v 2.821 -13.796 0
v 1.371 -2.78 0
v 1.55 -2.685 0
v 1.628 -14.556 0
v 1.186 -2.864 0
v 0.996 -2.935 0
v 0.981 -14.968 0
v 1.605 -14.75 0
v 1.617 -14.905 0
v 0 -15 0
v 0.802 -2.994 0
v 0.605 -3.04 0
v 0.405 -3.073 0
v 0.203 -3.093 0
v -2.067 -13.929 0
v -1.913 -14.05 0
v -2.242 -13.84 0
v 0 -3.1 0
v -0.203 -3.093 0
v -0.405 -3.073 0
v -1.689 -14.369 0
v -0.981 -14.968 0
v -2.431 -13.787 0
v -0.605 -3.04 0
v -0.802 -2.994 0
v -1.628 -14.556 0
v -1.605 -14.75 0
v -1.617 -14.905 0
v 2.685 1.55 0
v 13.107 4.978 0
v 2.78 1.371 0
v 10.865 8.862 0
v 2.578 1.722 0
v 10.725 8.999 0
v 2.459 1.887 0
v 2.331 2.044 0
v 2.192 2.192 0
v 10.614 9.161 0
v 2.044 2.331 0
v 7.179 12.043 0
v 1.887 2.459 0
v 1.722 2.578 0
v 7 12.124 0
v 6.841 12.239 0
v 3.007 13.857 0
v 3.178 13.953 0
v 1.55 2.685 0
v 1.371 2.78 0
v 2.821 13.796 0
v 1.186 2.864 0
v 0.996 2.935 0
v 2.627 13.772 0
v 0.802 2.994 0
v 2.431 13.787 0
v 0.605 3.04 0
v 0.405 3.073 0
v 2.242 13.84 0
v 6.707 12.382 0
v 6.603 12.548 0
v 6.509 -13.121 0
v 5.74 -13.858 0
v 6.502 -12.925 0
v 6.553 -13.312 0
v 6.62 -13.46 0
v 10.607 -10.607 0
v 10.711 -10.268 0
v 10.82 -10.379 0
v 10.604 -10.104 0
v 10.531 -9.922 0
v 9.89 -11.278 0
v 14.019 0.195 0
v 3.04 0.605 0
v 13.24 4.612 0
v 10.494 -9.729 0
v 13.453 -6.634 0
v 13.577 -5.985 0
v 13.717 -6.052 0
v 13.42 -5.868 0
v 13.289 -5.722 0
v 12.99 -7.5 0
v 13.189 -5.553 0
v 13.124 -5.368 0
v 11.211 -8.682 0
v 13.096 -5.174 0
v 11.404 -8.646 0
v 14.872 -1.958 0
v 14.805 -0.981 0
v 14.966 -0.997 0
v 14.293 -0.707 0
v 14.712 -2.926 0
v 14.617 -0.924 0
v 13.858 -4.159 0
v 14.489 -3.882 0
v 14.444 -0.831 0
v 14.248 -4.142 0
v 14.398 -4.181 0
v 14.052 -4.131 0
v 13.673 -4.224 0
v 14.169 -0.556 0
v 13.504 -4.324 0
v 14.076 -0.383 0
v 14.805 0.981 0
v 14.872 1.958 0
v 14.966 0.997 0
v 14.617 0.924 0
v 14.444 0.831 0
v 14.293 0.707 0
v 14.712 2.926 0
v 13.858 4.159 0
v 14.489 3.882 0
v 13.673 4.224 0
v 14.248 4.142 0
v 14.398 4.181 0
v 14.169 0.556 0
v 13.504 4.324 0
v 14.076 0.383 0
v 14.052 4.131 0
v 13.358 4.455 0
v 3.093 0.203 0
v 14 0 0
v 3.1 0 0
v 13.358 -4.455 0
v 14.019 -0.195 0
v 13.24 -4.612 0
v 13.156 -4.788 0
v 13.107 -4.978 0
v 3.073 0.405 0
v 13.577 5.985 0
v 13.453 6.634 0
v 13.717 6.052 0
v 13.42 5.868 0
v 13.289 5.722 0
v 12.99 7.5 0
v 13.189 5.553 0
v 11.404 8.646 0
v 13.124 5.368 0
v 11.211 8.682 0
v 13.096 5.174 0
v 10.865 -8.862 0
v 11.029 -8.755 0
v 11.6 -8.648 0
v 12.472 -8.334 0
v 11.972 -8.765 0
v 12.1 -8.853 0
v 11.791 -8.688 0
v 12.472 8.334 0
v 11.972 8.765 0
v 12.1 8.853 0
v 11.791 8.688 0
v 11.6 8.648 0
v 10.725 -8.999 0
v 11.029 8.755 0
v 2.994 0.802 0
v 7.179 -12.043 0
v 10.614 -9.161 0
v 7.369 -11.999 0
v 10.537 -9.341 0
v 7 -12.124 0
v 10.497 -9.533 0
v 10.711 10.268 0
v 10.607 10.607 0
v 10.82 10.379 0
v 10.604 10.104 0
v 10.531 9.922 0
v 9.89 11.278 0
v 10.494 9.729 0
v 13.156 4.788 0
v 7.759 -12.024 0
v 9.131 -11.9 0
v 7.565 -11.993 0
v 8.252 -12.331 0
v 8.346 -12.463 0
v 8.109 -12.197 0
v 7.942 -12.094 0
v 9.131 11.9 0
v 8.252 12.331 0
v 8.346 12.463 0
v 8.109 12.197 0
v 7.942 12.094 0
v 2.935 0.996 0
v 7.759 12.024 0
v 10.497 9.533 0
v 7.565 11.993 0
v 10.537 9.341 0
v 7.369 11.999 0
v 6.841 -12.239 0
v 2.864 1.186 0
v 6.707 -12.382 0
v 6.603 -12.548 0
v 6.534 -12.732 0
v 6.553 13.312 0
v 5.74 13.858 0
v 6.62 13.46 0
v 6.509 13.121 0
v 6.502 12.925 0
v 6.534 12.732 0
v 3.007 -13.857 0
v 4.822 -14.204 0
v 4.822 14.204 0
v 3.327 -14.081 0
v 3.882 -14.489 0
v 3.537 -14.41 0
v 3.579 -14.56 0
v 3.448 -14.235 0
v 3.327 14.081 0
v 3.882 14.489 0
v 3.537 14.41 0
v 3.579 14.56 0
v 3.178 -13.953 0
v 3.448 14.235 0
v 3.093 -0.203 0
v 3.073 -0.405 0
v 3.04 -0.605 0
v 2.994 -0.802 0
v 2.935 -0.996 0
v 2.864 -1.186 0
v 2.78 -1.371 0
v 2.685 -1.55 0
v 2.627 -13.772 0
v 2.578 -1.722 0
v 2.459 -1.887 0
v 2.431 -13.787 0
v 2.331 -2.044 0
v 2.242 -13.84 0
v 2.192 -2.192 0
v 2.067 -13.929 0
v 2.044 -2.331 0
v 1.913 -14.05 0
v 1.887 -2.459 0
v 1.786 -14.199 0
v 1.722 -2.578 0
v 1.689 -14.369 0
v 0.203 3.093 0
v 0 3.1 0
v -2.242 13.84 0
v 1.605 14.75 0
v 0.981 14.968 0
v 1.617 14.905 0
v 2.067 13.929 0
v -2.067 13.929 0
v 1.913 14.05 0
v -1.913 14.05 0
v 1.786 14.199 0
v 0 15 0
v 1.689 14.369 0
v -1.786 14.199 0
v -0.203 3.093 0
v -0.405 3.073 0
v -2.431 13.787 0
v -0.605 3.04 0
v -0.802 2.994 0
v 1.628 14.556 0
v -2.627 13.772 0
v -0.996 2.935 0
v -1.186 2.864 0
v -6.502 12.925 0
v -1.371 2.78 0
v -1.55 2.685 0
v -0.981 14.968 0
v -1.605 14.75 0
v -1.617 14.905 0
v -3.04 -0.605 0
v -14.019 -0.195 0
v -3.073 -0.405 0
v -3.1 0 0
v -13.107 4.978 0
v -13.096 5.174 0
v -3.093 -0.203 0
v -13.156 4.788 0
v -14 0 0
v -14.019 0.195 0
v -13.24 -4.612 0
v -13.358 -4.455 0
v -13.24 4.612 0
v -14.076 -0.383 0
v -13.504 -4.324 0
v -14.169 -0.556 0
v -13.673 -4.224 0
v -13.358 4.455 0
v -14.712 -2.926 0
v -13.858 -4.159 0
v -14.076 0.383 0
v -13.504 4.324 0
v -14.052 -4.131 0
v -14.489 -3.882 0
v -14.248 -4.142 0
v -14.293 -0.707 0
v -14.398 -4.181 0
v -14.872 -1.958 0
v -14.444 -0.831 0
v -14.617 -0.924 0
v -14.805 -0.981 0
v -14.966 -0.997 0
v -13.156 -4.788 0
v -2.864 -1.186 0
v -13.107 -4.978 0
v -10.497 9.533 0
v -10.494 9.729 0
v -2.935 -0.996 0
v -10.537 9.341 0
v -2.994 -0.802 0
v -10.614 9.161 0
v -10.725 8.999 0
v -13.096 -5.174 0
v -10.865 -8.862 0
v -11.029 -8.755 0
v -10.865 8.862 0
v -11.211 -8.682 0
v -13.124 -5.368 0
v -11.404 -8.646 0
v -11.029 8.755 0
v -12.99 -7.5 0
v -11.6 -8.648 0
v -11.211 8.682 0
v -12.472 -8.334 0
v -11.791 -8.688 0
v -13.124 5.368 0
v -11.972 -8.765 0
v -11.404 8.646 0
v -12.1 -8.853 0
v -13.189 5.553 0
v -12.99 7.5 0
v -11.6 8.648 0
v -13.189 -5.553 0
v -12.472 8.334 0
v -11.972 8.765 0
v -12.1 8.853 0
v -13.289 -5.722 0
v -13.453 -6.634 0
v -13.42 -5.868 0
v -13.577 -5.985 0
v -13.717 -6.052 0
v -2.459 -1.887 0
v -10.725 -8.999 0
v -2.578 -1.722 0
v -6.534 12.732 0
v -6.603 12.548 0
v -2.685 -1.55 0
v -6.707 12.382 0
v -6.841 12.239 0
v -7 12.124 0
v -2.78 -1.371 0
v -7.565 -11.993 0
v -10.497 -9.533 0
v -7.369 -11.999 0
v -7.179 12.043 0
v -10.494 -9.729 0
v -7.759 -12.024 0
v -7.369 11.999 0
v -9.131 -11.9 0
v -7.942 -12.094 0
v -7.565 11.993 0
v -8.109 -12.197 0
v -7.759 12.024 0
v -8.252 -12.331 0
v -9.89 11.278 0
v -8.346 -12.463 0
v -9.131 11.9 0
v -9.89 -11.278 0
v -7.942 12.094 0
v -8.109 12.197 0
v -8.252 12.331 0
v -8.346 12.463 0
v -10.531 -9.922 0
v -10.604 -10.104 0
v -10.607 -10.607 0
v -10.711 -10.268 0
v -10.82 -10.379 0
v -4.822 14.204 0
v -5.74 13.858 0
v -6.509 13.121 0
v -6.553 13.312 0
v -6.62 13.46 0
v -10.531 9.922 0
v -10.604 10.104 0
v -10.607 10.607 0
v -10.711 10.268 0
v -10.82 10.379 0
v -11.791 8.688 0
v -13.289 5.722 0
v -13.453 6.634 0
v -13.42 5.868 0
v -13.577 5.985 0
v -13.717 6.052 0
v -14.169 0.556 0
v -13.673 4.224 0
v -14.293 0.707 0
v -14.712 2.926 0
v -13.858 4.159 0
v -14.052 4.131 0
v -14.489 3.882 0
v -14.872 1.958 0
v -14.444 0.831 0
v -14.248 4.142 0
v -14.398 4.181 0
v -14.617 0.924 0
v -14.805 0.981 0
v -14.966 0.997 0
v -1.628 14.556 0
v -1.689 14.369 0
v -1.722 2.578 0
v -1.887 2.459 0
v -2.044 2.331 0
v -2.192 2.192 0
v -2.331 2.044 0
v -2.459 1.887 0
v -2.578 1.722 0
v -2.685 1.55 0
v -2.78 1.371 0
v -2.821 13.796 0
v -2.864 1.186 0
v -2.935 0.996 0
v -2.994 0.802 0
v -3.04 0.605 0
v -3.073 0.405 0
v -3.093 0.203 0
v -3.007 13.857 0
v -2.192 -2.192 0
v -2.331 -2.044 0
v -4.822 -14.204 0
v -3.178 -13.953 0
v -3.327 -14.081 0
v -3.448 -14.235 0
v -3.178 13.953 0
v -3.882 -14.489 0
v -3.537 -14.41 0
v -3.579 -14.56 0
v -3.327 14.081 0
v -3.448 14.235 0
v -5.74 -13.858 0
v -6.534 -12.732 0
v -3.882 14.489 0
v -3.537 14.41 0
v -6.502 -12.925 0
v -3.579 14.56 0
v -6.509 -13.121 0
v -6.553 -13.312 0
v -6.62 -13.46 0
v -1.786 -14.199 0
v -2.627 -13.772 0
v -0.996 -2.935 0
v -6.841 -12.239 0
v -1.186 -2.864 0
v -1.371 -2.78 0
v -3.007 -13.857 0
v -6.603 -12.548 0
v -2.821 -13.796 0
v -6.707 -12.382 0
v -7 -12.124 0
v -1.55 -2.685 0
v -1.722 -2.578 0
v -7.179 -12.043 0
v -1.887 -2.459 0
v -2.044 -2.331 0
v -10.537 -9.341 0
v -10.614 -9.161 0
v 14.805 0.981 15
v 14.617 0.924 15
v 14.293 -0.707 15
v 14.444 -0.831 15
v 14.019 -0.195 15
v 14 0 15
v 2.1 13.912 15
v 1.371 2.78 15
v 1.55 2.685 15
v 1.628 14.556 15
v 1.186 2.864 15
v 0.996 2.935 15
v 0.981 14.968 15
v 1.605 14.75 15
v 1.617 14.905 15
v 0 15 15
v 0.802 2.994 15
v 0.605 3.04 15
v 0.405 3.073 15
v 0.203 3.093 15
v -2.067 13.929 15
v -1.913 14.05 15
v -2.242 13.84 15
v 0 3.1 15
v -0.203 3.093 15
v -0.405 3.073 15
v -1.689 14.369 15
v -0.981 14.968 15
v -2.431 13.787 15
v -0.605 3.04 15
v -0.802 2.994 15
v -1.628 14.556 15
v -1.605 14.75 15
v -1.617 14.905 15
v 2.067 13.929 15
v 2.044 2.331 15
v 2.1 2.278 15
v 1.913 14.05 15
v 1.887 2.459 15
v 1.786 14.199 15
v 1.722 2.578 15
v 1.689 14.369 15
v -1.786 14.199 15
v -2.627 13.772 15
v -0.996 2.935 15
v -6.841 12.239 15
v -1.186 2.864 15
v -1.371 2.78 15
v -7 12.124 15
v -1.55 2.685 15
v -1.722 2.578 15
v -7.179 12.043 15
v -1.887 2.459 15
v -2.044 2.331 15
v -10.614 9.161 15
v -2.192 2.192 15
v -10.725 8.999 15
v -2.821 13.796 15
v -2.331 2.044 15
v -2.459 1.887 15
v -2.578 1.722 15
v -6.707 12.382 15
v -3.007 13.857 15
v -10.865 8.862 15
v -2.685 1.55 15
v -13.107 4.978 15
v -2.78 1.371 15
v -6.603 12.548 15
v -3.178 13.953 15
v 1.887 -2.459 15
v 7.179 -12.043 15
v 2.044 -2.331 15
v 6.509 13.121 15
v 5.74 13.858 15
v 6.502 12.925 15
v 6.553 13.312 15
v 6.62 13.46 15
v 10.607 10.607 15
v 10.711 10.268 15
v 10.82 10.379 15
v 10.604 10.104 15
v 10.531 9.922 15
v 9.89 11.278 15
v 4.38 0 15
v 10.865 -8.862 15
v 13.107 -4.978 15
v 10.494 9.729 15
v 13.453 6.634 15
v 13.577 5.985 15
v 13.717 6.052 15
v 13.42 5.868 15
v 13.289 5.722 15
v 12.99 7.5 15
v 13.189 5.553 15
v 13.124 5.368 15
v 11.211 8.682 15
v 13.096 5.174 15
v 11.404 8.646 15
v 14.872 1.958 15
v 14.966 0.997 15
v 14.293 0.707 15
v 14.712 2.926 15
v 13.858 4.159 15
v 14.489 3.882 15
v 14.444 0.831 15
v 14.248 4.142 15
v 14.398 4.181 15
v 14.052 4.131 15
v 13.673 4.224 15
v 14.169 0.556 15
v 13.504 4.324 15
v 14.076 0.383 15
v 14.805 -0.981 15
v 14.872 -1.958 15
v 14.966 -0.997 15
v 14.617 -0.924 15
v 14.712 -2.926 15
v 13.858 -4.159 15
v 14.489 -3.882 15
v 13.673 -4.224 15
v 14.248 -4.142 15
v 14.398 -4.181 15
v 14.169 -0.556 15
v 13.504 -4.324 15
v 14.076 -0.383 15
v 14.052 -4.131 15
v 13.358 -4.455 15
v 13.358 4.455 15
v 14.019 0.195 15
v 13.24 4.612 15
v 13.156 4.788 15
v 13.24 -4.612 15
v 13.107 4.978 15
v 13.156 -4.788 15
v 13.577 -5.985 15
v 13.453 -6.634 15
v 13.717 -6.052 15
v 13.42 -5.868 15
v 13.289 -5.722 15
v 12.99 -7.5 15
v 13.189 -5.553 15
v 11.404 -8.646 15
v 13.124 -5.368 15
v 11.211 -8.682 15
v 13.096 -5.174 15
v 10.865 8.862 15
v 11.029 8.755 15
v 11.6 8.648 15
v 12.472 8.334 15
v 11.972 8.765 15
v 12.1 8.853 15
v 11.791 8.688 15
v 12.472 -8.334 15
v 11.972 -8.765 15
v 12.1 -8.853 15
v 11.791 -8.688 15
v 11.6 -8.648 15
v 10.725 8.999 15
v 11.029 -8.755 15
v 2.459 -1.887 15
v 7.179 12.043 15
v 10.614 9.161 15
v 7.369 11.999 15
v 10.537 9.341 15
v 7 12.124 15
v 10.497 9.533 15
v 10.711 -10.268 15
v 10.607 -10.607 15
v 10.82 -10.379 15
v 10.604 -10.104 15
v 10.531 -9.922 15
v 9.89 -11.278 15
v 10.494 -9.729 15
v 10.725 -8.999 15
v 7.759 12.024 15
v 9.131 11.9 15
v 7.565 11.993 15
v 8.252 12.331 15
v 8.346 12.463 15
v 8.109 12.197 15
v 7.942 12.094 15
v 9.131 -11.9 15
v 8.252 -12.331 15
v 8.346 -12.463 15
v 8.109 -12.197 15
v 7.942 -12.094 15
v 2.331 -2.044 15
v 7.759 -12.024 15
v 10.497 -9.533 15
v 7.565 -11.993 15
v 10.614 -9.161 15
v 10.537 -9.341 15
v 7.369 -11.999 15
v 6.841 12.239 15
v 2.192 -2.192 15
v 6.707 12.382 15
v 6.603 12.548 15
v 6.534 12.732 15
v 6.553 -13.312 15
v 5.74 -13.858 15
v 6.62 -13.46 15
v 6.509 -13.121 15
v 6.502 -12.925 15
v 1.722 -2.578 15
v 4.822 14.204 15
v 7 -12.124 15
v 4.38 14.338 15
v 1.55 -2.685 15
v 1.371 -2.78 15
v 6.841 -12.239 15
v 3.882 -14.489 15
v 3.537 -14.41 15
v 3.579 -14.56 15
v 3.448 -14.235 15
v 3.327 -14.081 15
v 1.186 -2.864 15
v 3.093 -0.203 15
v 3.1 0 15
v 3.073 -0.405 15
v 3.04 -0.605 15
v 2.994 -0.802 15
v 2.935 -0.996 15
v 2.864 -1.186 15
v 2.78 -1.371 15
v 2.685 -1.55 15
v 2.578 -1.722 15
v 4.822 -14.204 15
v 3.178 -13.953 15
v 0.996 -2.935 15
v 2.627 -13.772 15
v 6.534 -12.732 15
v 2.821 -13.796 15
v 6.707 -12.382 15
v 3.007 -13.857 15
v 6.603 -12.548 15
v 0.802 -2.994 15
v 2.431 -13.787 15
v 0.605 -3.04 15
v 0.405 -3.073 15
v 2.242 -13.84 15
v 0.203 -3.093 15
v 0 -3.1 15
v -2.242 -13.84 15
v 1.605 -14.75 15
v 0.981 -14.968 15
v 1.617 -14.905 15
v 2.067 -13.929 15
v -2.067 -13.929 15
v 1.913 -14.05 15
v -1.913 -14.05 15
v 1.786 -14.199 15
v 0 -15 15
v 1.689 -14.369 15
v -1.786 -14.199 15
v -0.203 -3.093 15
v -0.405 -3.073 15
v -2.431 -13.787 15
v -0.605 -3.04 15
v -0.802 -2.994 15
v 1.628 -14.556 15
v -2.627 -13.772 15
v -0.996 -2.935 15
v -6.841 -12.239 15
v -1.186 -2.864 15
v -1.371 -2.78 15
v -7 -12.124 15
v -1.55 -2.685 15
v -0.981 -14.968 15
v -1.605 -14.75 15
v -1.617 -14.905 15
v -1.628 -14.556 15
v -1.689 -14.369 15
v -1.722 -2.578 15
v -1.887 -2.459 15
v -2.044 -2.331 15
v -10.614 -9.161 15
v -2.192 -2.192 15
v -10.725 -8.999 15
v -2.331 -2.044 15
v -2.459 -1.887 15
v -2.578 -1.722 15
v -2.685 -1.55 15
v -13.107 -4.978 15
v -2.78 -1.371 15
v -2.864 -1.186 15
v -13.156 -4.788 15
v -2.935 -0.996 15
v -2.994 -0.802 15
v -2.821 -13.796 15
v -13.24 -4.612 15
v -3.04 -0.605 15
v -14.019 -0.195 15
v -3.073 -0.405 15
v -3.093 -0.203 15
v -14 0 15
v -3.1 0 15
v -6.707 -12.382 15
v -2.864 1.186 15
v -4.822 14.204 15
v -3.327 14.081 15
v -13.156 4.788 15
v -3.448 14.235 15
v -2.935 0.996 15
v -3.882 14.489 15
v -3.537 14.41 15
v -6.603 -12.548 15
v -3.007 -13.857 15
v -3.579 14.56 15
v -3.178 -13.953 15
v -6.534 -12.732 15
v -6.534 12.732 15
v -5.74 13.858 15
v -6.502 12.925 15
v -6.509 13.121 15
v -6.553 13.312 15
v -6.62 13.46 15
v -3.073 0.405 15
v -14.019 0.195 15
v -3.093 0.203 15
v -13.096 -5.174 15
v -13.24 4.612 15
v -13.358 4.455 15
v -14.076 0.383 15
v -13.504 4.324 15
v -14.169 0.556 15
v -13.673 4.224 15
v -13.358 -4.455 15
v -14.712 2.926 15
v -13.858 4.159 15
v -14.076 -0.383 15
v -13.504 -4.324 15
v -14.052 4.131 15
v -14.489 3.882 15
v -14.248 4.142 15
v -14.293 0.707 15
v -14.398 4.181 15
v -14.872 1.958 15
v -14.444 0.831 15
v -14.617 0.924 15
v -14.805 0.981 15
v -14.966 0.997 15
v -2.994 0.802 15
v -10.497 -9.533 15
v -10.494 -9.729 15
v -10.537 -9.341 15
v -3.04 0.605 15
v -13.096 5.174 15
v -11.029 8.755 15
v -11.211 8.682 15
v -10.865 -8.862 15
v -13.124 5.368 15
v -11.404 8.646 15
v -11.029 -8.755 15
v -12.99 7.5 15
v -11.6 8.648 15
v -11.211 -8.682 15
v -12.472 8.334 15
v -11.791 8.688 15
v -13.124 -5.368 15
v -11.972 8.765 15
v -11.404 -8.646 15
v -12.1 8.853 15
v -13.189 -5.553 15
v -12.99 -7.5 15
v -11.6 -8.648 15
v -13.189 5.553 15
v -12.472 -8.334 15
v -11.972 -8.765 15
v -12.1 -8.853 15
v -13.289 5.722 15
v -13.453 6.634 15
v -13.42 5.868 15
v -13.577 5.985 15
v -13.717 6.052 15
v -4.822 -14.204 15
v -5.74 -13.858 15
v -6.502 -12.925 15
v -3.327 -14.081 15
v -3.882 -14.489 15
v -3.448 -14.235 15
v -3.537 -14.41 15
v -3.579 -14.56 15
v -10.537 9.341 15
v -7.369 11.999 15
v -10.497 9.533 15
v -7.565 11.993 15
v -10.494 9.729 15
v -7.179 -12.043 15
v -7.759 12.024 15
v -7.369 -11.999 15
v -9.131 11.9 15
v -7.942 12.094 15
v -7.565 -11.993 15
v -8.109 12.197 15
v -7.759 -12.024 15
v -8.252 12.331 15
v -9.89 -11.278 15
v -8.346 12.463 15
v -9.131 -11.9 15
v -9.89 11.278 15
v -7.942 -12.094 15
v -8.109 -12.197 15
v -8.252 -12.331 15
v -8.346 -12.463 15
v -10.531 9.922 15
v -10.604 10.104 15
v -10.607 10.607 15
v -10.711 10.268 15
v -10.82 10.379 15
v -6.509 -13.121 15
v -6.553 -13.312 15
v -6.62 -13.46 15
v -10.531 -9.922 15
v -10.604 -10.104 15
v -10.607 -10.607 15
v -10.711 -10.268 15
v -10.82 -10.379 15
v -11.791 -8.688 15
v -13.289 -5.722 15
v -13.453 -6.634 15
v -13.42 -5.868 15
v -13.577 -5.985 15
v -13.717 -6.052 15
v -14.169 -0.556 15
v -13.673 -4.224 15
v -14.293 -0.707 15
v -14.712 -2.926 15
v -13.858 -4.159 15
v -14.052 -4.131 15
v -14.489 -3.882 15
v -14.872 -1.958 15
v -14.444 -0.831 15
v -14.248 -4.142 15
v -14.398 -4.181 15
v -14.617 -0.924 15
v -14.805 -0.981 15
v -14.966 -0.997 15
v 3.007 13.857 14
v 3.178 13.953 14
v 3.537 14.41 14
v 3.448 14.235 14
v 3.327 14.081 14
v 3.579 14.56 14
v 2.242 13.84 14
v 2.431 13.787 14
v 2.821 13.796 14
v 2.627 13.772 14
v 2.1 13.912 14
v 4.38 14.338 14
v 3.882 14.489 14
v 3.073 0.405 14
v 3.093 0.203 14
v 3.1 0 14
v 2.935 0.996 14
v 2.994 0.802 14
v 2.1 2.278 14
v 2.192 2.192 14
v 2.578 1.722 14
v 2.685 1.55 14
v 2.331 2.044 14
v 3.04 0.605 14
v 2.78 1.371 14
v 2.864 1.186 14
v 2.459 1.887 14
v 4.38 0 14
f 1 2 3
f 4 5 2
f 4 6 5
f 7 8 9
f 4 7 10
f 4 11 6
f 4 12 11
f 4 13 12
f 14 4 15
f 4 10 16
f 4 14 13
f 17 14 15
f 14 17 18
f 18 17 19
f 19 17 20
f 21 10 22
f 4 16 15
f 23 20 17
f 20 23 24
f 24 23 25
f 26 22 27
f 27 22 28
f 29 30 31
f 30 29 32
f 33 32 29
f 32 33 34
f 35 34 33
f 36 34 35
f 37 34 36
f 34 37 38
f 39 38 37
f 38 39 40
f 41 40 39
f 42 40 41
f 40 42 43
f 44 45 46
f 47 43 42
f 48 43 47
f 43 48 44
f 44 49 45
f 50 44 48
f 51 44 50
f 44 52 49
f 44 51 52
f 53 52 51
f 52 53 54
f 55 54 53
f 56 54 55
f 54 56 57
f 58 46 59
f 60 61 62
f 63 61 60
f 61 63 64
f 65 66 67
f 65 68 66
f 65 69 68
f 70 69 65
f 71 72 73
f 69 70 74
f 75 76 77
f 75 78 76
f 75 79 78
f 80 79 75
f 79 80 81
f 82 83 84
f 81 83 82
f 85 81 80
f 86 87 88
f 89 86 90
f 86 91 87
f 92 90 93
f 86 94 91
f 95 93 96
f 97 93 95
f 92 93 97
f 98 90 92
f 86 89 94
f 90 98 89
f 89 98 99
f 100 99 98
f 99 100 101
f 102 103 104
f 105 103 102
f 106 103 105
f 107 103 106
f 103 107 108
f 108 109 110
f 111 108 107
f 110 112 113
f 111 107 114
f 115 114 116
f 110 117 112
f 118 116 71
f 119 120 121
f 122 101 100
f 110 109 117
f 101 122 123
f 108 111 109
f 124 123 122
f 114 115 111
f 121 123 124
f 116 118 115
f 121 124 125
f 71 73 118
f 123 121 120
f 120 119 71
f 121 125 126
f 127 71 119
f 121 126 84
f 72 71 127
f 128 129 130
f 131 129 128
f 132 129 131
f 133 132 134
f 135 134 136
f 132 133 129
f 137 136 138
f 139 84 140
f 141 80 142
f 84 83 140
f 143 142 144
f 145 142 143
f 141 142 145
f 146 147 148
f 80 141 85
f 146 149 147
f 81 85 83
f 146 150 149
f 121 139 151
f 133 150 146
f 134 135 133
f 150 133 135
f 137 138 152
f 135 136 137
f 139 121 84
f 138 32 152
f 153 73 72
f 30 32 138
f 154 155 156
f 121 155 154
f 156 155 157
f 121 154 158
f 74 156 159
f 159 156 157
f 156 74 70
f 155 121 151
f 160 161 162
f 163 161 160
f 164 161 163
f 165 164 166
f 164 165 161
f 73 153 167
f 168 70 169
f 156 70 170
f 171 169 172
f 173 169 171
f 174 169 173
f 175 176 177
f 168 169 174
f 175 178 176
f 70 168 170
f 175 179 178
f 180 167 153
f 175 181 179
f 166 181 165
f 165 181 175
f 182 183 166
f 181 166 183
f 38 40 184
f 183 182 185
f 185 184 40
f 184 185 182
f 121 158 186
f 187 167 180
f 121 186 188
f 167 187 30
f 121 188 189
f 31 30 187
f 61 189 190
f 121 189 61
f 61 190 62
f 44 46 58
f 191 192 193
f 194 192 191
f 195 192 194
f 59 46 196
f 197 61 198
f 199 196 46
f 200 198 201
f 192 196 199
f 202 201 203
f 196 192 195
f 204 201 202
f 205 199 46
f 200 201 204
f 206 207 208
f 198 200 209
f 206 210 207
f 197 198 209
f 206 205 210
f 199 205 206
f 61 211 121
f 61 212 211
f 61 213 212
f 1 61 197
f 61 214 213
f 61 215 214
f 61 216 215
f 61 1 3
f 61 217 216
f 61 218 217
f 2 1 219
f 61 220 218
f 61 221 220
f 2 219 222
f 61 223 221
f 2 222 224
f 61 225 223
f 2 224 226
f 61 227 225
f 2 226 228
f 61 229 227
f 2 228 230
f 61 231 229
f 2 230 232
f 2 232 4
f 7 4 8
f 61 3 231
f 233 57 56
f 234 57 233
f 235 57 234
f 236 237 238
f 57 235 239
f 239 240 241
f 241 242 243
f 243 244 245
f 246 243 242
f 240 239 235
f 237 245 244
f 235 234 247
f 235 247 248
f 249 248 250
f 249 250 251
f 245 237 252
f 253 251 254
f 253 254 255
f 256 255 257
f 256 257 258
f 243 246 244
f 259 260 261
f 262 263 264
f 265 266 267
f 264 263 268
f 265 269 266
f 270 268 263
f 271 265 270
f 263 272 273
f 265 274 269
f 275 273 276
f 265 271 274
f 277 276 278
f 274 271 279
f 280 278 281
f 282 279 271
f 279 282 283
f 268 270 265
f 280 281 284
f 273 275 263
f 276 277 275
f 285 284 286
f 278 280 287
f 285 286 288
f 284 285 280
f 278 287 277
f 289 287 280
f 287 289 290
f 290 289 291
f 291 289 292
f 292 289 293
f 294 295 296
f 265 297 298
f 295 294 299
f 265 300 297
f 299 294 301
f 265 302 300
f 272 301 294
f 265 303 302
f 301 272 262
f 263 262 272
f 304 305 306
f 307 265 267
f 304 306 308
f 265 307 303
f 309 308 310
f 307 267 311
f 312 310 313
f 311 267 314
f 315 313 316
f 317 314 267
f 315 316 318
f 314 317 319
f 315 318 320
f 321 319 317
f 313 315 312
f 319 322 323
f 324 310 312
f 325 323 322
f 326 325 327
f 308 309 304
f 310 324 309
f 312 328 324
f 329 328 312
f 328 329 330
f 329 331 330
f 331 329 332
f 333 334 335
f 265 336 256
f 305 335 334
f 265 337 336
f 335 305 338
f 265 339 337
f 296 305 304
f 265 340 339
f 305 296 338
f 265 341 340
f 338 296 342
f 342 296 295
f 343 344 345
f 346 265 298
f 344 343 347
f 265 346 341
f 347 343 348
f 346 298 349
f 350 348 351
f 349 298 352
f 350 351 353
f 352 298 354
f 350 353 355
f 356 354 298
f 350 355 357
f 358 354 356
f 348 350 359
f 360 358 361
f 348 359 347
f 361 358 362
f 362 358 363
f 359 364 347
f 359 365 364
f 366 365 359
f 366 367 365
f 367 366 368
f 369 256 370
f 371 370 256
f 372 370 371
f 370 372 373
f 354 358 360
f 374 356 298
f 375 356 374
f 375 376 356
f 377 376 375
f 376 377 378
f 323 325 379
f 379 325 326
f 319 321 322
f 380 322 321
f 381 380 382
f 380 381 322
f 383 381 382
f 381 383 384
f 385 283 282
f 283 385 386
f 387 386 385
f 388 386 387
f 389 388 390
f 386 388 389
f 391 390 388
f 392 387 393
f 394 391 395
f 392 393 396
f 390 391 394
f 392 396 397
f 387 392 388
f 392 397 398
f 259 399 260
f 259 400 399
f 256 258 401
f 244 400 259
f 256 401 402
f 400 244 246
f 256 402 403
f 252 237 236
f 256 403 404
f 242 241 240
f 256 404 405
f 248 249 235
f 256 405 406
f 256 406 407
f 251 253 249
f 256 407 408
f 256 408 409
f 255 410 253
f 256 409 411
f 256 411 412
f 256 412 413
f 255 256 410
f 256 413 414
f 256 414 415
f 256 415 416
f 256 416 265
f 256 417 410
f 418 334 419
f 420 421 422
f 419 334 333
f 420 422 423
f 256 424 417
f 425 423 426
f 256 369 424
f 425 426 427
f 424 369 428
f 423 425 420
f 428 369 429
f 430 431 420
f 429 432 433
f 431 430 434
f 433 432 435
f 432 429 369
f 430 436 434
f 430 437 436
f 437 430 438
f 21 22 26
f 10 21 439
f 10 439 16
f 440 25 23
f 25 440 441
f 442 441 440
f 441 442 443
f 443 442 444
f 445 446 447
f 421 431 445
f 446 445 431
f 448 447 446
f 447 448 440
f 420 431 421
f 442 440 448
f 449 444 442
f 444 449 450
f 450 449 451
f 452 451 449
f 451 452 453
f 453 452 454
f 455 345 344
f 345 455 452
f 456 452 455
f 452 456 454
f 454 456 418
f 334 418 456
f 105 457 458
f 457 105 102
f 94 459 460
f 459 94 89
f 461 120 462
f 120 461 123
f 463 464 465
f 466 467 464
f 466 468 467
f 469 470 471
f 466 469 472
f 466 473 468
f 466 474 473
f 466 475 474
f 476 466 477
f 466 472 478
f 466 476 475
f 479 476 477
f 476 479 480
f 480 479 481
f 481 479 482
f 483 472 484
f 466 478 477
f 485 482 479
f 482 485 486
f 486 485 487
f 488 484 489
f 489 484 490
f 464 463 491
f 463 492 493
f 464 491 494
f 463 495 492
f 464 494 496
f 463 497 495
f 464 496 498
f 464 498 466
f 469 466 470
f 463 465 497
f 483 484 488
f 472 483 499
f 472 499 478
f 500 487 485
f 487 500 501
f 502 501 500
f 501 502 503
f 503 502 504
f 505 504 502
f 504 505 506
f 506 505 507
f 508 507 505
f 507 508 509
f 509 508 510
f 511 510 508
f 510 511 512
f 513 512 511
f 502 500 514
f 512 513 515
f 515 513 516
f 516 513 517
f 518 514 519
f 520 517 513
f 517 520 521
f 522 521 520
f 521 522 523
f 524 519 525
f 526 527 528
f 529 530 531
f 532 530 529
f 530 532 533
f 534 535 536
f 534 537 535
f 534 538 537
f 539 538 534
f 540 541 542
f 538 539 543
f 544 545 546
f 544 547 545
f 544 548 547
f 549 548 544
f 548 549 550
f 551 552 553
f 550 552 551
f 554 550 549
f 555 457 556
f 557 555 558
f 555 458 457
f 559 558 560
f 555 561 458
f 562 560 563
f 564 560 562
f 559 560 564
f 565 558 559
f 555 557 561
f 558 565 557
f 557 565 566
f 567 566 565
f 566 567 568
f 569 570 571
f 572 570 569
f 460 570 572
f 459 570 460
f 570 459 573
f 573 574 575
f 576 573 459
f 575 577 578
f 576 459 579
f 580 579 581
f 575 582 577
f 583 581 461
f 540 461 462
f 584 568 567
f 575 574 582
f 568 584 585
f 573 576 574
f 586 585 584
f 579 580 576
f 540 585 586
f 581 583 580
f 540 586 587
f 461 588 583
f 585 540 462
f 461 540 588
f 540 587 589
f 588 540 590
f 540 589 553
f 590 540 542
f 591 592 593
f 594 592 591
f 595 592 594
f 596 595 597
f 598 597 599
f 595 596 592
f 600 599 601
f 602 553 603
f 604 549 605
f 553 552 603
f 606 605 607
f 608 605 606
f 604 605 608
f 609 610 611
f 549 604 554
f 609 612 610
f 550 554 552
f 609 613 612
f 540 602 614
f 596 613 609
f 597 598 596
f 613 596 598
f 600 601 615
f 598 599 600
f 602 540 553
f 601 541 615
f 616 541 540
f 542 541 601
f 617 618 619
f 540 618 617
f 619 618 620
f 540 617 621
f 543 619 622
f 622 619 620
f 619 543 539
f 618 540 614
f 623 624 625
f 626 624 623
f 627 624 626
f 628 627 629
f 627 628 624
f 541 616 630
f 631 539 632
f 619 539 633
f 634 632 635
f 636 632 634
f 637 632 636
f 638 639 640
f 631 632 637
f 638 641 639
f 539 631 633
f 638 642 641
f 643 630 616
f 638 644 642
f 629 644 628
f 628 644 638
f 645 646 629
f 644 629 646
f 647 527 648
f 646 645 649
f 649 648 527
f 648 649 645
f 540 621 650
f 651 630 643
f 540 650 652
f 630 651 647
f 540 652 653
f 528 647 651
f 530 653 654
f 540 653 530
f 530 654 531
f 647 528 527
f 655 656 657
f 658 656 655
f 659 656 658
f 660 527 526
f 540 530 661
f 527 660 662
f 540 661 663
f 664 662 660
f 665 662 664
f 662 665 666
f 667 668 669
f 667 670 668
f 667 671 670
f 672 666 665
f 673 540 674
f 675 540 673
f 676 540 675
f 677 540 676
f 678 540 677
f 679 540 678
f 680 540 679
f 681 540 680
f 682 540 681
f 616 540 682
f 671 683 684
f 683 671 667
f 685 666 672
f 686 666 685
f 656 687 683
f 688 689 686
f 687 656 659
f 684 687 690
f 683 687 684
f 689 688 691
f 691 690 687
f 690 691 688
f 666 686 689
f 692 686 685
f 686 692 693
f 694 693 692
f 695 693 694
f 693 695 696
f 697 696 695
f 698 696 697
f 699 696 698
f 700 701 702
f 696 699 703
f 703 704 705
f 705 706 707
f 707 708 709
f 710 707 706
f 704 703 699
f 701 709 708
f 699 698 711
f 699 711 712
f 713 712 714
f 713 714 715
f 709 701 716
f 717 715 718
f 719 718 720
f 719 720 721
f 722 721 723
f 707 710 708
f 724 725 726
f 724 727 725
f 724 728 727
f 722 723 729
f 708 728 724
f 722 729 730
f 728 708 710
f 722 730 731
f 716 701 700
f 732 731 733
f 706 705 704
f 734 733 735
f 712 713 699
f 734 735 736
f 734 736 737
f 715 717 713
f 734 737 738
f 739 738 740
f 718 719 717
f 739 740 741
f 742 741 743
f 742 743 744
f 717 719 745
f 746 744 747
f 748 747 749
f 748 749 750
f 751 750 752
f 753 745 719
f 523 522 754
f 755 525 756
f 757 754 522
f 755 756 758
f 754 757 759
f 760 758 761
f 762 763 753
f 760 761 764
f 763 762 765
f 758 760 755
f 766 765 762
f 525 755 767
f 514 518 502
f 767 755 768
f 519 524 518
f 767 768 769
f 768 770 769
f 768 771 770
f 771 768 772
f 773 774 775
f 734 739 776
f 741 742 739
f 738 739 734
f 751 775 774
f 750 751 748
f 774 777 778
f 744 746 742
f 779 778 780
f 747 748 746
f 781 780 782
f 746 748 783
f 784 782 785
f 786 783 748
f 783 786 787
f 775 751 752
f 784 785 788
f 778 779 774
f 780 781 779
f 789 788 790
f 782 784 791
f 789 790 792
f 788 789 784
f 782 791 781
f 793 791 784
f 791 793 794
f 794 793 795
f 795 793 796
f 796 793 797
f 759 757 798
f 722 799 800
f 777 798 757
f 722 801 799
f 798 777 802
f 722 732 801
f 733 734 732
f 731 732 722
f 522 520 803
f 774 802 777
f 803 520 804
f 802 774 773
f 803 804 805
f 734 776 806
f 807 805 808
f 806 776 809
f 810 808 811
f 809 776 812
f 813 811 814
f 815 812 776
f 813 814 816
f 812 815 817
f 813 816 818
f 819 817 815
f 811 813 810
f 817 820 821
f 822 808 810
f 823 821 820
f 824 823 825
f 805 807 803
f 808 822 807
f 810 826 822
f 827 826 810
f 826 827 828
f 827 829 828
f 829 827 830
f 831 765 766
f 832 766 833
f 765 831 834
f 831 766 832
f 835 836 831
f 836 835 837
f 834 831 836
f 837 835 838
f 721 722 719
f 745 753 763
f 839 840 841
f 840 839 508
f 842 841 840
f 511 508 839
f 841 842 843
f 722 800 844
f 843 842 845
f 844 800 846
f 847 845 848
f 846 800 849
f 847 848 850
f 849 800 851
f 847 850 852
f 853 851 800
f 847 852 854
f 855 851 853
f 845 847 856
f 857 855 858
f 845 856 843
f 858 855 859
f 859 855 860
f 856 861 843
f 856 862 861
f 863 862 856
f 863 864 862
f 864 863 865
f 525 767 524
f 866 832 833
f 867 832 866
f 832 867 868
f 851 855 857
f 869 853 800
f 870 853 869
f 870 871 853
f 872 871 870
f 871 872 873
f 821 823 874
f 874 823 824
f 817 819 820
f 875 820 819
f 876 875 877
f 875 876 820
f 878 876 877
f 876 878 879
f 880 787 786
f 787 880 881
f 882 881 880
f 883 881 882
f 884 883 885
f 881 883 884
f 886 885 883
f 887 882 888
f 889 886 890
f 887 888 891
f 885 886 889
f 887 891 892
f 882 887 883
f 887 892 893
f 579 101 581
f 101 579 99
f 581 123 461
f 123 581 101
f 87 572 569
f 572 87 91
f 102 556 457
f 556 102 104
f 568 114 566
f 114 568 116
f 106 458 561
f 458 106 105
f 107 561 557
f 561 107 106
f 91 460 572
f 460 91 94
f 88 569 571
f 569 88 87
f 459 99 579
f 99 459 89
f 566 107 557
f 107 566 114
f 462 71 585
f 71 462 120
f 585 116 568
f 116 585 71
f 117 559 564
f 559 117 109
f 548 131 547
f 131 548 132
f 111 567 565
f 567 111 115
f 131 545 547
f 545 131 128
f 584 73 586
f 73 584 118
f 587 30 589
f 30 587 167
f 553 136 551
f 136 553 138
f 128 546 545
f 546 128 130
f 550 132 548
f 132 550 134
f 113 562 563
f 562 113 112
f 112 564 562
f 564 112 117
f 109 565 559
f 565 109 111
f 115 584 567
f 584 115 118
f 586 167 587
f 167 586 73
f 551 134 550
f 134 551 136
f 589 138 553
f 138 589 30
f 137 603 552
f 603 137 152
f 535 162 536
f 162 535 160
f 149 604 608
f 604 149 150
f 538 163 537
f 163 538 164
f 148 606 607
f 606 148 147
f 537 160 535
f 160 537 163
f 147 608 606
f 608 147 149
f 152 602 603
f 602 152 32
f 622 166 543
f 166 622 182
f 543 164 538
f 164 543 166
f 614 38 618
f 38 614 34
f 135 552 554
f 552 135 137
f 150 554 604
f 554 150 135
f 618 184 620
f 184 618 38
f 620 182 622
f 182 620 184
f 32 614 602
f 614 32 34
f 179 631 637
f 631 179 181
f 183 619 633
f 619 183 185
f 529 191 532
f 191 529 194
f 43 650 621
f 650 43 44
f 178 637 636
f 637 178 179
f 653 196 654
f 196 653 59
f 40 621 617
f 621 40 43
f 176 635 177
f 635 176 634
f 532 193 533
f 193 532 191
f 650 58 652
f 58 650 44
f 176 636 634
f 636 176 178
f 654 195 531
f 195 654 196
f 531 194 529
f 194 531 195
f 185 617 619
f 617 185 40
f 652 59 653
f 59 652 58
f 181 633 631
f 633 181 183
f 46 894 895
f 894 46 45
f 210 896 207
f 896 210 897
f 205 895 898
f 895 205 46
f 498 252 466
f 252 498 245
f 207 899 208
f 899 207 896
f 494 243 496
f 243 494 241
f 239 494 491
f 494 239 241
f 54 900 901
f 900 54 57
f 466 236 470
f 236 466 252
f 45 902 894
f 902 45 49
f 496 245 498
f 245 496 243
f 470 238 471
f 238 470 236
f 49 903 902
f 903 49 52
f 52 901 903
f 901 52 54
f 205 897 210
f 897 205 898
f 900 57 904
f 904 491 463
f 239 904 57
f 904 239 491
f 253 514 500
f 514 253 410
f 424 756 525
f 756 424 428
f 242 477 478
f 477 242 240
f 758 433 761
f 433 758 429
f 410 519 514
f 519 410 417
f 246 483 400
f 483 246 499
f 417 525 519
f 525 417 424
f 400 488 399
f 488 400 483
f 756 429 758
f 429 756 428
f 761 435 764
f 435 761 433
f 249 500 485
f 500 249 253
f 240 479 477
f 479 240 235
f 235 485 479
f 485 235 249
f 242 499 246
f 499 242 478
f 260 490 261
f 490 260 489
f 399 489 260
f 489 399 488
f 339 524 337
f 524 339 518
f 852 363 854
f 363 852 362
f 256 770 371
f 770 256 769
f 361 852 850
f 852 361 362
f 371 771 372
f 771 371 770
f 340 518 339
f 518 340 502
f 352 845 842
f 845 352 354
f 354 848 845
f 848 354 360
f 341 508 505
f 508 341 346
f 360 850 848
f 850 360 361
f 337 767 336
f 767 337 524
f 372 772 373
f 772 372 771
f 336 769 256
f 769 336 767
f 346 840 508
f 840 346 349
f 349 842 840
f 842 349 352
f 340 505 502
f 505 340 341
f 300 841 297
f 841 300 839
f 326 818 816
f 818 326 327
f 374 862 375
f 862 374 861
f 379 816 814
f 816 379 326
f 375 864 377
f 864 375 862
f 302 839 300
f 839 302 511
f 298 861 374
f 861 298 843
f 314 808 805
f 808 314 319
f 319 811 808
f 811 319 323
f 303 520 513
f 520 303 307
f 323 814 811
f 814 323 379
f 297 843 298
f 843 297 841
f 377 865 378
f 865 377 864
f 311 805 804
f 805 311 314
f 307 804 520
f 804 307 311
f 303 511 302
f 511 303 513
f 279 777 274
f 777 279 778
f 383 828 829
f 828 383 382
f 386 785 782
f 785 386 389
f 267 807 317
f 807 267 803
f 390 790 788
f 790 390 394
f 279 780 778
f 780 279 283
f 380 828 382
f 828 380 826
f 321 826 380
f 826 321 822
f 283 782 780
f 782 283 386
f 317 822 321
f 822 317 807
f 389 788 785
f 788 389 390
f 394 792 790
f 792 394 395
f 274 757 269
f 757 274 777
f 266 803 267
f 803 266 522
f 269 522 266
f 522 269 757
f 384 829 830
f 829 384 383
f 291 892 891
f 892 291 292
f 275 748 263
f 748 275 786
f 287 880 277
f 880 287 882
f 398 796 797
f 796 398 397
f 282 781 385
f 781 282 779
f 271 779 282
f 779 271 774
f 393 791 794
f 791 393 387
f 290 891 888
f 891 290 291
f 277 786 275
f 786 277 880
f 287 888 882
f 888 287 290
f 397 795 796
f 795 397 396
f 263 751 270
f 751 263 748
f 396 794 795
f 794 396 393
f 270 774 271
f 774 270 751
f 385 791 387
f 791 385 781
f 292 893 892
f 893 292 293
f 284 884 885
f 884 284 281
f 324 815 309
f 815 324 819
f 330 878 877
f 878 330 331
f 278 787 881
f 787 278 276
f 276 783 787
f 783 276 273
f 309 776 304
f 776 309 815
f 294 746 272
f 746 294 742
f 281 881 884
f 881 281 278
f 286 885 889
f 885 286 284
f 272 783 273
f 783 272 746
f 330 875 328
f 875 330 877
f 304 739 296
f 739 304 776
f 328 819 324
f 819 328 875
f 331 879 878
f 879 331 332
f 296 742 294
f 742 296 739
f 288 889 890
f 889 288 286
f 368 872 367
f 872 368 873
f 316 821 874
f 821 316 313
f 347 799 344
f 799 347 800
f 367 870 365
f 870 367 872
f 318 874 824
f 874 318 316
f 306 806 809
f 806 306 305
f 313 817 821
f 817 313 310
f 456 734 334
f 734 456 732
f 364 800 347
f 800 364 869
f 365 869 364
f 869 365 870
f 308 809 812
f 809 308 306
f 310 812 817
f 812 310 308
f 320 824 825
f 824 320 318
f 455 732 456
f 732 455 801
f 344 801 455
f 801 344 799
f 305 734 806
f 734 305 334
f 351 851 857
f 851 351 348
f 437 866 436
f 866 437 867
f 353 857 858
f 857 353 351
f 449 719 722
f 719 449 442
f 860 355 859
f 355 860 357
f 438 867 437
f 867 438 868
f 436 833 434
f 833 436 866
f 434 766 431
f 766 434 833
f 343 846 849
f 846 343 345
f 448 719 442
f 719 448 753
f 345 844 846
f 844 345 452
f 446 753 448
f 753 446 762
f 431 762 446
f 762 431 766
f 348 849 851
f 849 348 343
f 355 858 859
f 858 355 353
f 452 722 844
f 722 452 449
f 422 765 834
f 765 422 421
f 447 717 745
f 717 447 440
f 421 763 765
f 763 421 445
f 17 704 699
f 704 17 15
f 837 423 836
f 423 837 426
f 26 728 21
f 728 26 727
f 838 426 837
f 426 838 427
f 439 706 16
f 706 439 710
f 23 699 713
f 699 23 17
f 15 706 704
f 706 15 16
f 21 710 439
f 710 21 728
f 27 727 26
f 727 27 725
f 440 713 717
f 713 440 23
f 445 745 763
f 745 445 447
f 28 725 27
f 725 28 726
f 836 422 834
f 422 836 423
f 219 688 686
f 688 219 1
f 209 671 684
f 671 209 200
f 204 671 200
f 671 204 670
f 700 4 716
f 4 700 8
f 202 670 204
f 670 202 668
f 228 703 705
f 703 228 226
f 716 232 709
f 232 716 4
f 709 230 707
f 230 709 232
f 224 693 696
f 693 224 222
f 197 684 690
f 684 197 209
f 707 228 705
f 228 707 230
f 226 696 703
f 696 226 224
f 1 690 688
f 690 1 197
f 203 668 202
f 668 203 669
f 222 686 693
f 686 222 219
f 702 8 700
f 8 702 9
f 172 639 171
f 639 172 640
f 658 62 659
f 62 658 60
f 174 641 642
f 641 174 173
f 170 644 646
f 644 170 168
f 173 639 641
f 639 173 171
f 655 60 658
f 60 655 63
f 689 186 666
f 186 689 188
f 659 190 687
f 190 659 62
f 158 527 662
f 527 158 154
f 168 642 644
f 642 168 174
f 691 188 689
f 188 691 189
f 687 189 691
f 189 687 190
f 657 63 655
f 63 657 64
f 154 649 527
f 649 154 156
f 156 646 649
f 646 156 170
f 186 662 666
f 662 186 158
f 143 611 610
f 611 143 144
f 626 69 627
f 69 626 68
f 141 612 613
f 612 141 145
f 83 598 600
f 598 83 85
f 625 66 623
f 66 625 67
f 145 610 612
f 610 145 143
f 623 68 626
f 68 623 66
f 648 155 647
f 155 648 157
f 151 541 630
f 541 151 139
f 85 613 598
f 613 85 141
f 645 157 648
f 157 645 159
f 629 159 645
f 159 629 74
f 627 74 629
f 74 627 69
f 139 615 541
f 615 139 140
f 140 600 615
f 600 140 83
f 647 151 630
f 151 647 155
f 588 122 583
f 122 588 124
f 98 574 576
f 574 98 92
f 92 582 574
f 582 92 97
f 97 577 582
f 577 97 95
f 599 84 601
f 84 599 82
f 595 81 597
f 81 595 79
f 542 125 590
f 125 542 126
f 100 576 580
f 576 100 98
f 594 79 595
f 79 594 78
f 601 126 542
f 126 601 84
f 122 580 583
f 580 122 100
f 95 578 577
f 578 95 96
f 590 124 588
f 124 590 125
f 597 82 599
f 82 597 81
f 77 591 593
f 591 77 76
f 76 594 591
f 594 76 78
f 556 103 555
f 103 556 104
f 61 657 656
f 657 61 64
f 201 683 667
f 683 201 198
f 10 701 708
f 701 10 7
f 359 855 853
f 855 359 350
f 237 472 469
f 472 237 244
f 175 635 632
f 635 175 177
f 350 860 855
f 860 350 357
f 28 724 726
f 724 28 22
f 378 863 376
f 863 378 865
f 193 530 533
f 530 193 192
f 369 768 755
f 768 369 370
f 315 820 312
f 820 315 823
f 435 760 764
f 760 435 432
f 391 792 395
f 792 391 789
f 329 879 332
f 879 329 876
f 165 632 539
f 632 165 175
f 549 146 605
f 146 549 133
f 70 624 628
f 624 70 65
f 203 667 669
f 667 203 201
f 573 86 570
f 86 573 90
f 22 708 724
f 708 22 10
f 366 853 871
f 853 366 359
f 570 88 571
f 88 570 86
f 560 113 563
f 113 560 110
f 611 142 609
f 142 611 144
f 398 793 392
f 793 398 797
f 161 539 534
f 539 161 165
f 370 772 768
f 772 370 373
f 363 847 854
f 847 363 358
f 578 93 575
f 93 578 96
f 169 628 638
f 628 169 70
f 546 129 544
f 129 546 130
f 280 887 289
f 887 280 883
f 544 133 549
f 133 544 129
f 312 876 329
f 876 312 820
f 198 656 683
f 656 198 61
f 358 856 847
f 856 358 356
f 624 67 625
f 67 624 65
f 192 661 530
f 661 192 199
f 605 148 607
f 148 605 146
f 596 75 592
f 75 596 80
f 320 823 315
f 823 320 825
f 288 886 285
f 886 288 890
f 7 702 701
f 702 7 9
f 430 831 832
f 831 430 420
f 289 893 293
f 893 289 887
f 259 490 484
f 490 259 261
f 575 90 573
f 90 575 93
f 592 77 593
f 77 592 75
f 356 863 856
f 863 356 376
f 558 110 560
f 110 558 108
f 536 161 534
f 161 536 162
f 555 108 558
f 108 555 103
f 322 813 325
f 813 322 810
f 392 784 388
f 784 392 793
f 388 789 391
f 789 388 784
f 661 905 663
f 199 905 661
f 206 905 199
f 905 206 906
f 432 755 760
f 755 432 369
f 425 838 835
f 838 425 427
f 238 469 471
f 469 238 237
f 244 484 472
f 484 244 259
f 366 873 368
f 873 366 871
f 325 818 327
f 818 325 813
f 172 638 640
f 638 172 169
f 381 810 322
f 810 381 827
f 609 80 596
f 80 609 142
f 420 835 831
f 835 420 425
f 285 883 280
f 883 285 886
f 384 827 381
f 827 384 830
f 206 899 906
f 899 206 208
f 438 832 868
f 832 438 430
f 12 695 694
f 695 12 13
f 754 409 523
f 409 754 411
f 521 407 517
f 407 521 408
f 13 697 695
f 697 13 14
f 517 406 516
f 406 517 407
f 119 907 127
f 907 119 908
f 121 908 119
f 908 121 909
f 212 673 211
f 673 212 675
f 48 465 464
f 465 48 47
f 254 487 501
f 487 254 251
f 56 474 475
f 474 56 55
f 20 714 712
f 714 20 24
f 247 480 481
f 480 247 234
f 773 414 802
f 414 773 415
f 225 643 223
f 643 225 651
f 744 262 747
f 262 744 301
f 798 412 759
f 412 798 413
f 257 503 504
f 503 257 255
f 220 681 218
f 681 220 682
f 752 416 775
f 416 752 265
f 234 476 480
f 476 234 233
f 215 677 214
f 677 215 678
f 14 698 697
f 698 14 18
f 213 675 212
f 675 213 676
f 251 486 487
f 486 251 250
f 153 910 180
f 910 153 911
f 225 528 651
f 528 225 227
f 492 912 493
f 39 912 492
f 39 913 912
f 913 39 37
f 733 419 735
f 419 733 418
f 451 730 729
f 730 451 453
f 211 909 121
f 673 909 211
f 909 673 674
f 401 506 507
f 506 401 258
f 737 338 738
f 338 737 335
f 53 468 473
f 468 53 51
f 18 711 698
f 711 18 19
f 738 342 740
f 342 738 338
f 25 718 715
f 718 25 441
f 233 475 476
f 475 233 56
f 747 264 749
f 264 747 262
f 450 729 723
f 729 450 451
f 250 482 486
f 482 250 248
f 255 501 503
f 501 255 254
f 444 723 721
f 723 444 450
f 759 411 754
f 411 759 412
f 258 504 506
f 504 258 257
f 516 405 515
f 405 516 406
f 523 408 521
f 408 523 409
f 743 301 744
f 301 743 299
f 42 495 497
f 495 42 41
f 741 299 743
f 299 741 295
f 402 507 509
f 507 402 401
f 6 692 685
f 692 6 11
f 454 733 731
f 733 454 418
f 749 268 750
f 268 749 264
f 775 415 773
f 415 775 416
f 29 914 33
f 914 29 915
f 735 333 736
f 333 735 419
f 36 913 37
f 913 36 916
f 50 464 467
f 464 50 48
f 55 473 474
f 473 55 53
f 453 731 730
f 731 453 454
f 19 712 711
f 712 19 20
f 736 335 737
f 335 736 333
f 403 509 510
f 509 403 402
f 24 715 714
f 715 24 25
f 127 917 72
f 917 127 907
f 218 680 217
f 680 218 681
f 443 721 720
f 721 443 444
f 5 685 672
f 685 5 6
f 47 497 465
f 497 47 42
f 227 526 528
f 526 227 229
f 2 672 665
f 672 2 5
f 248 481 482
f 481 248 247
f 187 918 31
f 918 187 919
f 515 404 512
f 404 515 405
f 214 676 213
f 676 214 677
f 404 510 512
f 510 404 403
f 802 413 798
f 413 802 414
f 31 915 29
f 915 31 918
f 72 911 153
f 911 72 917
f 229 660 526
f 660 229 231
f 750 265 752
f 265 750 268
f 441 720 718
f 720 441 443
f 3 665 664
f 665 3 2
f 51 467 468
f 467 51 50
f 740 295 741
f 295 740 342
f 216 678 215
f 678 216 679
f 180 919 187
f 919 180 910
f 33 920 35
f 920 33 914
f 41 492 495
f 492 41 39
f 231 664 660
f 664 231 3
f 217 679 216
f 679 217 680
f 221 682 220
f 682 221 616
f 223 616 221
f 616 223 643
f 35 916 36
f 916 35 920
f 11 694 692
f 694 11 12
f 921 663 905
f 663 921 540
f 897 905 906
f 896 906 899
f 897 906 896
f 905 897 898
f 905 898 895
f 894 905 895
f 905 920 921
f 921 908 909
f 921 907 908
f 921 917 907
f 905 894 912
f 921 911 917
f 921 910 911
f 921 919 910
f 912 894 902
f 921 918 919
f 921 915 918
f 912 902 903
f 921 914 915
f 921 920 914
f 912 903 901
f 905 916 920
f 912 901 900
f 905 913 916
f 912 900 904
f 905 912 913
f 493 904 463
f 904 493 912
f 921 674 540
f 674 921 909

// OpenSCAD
// Replacement knob for a hotplate stirrer with a 6 mm D-shaft
// Print orientation: the side that faces the hotplate is down on the bed (z = 0)

// ---------------- Parameters ----------------
knob_d        = 30;    // knob outer diameter (mm)
knob_h        = 15;    // knob height (mm)

shaft_d       = 6.2;   // D-bore diameter (mm)
shaft_flat    = 4.7;   // distance from the flat to the opposite side of the circle (mm)

groove_count  = 18;    // number of vertical grip grooves (mm)
groove_d      = 2;     // groove diameter (mm)

pointer_w     = 1.5;   // pointer groove width (mm)
pointer_d     = 1;     // pointer groove depth (mm)

eps           = 0.5;   // overcut for clean differences (mm)

$fn = 96;              // curve resolution

// ---------------- Derived ----------------
shaft_r = shaft_d / 2;
// chord length of the D at depth = pointer_d
chord   = sqrt(shaft_r * shaft_r - (shaft_r - pointer_d) * (shaft_r - pointer_d));

// ---------------- Model ----------------
difference() {
    // Main body
    cylinder(d = knob_d, h = knob_h);

    // D-shaped blind bore from the bottom face
    translate([0, 0, -eps])
        linear_extrude(height = knob_h + 2 * eps)
            union() {
                circle(r = shaft_r, $fn = 96);
                translate([shaft_r - pointer_d, 0, 0])
                    cube([chord, shaft_r * 2, knob_h + 2 * eps]);
            }

    // Vertical grip grooves, evenly spaced, centred on the outer surface
    for (i = [0 : groove_count - 1])
        rotate([0, 0, i * 360 / groove_count])
            translate([knob_d / 2, 0, 0])
                cylinder(d = groove_d, h = knob_h, $fn = 32);

    // Pointer groove on the top face, running from the centre to the outer edge
    translate([shaft_r - pointer_d, 0, knob_h - pointer_d])
        cube([chord, knob_d - shaft_r, pointer_d]);
}
